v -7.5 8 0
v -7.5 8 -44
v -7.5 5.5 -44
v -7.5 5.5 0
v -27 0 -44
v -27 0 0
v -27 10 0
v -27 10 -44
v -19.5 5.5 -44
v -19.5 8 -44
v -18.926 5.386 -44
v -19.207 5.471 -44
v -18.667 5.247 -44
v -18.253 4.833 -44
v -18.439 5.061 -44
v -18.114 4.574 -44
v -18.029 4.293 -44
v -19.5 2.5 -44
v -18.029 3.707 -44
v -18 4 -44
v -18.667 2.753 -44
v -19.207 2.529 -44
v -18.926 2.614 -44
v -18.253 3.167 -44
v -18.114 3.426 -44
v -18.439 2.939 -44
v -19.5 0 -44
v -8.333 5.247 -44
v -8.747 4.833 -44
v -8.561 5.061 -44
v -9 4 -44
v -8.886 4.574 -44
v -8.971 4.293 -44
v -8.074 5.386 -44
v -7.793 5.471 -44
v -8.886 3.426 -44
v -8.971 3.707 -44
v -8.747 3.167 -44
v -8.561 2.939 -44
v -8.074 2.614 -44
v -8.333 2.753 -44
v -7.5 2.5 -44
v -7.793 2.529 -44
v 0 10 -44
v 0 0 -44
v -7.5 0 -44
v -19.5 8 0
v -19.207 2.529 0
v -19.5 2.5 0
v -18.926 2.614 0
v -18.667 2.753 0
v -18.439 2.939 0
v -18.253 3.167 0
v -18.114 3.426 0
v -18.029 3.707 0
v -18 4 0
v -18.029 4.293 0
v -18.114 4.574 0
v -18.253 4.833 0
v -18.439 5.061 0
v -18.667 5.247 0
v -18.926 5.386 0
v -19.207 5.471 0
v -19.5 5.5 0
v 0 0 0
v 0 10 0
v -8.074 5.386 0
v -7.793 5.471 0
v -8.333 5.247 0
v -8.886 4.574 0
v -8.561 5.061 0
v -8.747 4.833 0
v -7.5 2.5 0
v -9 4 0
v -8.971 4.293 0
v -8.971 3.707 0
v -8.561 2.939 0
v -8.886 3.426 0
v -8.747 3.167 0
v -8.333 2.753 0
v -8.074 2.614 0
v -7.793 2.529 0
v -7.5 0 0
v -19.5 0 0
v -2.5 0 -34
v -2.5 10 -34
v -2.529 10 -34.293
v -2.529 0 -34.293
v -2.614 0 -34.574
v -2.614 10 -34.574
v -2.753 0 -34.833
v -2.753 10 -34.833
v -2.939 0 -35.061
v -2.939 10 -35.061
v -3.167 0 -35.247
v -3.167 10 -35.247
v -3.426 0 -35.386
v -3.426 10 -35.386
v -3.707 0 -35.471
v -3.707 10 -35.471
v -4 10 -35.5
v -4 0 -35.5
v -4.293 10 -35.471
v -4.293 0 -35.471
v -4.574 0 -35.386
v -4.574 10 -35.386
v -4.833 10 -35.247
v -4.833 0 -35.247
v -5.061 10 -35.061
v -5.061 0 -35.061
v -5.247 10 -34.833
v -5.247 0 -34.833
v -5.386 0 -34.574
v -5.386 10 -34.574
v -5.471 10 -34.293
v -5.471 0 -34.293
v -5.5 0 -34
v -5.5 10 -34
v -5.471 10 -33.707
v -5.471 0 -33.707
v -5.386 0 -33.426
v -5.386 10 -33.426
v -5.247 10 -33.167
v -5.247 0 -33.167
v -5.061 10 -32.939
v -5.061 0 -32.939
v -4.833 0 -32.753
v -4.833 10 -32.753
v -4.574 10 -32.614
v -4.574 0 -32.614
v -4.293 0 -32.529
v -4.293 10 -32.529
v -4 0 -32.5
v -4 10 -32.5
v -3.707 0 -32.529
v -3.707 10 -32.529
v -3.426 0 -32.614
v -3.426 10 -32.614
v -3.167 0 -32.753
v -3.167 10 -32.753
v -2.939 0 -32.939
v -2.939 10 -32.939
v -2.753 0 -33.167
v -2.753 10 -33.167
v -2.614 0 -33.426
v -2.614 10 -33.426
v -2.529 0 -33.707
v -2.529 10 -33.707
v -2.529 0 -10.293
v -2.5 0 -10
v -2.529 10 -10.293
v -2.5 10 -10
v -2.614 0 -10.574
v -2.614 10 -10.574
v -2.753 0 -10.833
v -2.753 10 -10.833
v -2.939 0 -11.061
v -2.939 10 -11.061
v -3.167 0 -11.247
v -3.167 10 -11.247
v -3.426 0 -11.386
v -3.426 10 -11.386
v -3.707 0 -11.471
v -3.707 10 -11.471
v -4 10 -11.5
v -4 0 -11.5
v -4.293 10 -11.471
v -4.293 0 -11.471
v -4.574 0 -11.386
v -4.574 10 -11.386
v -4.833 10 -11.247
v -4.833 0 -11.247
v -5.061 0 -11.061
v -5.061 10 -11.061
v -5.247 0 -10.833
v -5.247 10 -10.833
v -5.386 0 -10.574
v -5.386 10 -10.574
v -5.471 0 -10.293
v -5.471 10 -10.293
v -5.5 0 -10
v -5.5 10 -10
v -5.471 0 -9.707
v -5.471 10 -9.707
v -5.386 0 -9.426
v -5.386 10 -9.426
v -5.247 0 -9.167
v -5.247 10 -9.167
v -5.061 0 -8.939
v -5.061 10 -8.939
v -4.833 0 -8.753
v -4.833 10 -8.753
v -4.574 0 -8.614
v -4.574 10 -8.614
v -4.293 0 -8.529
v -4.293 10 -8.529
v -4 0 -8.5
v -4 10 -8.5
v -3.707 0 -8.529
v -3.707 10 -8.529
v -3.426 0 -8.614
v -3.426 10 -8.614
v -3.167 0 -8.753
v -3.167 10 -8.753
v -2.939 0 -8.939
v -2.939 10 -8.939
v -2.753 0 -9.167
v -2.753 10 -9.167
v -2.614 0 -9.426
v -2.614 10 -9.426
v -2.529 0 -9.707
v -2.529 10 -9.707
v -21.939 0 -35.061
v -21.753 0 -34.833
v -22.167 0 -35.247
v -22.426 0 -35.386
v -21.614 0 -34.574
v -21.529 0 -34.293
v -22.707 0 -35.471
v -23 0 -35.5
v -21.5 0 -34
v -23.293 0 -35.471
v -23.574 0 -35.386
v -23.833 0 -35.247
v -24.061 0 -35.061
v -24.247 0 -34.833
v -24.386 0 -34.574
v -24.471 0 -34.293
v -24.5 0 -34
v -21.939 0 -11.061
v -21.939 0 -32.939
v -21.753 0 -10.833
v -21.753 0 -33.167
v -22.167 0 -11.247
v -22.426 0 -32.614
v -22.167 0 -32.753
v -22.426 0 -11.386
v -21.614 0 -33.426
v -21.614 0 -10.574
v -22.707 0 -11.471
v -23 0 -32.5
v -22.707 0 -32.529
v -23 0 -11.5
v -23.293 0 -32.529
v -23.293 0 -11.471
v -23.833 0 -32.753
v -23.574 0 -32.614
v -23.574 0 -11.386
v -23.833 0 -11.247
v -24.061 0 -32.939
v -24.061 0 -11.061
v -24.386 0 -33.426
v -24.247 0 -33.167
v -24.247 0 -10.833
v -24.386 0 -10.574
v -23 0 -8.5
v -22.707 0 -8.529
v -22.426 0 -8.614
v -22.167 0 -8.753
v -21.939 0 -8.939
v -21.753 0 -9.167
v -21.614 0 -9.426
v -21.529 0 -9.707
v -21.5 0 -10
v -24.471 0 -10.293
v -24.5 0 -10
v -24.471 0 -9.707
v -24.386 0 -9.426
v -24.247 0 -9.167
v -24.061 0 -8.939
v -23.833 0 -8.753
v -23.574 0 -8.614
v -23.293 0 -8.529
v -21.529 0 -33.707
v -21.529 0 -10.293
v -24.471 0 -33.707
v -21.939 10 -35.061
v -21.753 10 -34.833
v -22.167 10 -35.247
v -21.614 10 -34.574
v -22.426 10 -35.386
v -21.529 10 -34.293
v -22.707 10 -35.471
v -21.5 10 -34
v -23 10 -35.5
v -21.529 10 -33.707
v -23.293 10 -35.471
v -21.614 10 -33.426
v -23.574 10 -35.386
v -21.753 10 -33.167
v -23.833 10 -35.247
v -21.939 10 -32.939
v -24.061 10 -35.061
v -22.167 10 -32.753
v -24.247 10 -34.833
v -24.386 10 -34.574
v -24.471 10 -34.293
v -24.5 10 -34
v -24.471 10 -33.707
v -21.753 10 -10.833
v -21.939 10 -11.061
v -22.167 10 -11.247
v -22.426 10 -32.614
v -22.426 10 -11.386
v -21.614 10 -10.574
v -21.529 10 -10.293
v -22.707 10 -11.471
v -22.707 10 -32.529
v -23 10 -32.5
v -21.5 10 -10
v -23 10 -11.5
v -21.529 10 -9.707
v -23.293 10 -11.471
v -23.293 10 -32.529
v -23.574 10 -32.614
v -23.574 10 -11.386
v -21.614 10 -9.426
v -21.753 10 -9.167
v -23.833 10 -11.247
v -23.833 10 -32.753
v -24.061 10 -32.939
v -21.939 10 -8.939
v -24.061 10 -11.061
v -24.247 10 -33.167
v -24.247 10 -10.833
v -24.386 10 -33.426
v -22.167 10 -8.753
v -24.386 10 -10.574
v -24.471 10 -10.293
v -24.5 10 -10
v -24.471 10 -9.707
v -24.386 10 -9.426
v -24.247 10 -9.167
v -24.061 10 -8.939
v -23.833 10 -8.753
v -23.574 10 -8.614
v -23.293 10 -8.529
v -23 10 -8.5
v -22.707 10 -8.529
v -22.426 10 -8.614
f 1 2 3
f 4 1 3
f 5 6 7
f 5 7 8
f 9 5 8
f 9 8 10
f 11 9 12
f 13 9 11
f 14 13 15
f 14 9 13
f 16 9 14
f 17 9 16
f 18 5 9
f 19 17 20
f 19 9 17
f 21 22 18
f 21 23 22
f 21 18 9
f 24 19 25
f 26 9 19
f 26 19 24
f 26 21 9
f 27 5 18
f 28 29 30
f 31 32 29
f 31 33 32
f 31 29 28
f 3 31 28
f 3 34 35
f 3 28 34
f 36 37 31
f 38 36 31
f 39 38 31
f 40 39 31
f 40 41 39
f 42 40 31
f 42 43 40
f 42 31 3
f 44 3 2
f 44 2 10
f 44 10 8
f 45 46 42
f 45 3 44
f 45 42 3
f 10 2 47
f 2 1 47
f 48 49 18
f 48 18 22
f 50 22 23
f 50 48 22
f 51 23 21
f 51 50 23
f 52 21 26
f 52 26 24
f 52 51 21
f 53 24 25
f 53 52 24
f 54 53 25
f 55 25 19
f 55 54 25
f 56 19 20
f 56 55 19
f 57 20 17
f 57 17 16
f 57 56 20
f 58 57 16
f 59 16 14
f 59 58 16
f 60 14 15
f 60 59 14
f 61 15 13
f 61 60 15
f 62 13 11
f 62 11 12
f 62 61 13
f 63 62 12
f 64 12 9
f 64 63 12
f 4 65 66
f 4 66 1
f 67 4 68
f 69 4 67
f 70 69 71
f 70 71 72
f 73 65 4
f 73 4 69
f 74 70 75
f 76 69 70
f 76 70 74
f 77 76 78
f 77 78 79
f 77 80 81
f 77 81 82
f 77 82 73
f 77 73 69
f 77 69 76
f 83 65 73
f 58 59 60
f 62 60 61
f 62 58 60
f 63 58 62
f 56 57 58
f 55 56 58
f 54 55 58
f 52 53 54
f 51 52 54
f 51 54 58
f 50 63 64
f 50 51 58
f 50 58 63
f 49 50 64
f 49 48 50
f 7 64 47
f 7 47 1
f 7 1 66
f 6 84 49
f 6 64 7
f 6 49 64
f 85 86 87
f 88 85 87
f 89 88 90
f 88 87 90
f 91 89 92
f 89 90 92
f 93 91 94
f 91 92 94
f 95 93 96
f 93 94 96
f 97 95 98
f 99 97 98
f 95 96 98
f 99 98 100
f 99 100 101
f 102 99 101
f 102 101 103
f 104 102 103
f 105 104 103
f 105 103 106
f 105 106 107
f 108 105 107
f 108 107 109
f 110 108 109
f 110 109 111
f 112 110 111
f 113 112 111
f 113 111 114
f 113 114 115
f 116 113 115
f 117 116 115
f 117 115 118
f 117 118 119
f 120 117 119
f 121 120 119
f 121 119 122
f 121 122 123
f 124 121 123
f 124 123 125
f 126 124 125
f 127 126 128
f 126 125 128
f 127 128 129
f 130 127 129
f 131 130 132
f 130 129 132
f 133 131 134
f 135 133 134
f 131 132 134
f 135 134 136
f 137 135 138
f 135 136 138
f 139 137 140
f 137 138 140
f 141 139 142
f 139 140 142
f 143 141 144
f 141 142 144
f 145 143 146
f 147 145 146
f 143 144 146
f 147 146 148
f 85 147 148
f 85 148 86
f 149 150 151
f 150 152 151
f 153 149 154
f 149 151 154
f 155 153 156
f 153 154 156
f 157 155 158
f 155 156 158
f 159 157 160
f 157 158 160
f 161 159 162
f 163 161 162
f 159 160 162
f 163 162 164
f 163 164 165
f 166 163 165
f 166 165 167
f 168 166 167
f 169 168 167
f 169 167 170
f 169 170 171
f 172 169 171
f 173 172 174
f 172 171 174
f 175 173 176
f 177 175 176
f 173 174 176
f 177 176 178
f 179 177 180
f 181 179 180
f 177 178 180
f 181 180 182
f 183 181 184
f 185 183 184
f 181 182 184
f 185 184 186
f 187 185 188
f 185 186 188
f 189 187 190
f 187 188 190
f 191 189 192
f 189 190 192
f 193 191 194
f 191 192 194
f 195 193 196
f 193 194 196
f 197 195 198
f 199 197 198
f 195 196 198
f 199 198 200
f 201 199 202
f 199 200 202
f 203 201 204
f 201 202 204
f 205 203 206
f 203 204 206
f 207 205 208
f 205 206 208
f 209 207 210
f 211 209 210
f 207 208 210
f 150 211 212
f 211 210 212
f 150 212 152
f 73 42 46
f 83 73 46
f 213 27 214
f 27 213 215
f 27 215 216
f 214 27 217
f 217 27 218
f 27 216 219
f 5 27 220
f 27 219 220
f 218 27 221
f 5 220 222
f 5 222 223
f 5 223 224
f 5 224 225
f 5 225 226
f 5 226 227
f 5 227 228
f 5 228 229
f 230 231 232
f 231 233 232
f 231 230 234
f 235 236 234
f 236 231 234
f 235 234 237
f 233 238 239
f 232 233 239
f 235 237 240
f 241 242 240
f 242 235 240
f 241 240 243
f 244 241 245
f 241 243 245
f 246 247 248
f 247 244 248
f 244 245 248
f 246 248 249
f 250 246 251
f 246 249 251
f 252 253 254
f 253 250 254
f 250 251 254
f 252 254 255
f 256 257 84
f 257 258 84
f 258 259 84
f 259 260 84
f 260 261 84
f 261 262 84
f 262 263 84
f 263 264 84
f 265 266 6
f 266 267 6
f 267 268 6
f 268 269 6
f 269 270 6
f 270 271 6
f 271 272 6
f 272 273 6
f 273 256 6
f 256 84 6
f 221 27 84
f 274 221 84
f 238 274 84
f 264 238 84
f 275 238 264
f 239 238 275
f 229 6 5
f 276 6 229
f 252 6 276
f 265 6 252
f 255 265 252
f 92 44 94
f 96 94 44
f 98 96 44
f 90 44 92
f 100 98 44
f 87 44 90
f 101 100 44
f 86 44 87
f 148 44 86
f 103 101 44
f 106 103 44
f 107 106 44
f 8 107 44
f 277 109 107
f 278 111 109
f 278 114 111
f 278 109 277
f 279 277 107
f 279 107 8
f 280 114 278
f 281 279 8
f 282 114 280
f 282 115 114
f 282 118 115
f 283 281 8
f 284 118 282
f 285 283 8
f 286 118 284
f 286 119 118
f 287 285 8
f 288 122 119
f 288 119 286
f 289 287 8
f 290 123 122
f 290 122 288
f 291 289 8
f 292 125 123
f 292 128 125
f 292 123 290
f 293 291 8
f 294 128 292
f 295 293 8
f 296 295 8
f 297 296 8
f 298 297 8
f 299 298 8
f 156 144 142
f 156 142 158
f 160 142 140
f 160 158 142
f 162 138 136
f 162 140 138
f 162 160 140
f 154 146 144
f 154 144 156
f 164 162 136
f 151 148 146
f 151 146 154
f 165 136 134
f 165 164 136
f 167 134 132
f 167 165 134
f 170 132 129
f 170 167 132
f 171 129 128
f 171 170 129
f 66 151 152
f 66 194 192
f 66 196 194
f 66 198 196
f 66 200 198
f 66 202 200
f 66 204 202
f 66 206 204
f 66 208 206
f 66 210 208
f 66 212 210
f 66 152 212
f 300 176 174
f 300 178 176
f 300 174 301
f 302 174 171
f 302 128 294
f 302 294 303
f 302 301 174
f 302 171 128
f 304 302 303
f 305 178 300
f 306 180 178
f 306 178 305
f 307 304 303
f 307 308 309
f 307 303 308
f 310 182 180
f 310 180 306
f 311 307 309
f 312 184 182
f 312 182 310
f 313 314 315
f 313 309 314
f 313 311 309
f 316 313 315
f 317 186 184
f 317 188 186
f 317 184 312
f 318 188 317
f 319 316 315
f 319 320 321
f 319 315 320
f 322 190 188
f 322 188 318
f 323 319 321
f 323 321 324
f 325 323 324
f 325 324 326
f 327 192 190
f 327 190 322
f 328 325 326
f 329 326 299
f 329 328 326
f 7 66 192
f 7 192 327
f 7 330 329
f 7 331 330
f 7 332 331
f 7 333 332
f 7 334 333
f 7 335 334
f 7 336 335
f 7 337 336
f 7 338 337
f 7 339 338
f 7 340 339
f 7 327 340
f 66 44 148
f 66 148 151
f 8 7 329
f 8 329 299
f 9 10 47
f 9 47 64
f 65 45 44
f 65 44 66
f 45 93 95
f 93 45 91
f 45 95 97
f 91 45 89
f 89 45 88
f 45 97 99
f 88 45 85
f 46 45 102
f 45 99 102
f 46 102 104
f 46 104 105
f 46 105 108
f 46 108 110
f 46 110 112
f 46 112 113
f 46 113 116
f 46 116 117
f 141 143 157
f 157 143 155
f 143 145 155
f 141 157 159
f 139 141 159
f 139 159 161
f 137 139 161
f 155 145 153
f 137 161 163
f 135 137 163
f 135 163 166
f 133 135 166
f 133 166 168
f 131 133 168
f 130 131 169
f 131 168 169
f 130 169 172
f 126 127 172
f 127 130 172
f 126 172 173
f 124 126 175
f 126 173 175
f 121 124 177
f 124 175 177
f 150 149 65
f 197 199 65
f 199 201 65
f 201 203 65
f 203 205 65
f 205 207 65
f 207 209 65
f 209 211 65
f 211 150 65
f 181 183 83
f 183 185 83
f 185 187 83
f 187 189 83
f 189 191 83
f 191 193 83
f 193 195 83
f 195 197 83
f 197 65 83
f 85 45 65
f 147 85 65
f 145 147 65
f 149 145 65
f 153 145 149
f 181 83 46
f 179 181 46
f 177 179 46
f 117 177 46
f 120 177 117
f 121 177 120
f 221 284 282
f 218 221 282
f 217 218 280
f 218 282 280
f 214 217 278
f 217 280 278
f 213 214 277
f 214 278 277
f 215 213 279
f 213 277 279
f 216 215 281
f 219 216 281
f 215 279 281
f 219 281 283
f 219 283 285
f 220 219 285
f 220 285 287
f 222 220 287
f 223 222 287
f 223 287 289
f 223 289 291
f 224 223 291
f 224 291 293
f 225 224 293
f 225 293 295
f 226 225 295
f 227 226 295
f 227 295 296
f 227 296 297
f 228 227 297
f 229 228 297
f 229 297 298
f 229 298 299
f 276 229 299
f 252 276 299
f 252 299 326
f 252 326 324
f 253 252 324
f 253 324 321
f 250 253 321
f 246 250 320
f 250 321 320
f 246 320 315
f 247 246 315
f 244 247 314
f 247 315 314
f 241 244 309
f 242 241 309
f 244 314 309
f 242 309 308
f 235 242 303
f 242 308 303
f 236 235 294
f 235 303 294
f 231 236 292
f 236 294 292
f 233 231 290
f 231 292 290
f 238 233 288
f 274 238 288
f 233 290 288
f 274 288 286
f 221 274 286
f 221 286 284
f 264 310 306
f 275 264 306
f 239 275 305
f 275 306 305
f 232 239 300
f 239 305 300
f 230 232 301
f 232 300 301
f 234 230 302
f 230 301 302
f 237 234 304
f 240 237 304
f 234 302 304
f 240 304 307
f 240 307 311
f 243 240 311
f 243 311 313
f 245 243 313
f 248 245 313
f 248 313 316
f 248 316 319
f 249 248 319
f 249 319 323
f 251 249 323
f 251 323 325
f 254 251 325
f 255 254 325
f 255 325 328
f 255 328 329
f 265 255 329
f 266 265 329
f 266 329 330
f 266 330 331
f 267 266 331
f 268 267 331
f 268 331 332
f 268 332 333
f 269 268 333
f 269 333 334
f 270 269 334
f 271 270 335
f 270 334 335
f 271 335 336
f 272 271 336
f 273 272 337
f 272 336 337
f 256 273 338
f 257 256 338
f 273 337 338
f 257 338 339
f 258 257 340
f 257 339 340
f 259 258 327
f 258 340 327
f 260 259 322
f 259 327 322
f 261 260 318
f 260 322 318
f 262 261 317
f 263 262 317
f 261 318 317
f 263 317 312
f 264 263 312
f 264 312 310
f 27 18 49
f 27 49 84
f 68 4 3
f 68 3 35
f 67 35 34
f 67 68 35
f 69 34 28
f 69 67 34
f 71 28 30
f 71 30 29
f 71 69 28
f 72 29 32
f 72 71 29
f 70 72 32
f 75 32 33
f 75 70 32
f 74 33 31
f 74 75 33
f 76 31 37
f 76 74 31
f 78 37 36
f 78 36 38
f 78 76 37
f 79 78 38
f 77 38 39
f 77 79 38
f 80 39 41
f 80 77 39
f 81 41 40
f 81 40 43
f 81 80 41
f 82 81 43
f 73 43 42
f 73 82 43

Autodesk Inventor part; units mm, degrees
ref_plane "YZ Plane" through (0, 0, 0) normal (1, 0, 0) x (0, 1, 0)
ref_plane "XZ Plane" through (0, 0, 0) normal (0, 1, 0) x (-1, 0, 0)
ref_plane "XY Plane" through (0, 0, 0) normal (0, 0, 1) x (1, 0, 0)
sketch "草图1" plane through (0, 0, 0) normal (0, 1, 0) x (-1, 0, 0)
  line L0 (0, 0) -> (27, 0)
  line L1 (27, 0) -> (27, -44)
  line L2 (27, -44) -> (0, -44)
  line L3 (0, -44) -> (0, 0)
  dimension "d0" = 44
  dimension "d1" = 27
extrude "拉伸1" add sketch "草图1" along normal blind 10
sketch "草图2" plane through (-27, 0, 0) normal (0, 0, 1) x (1, 0, 0)
  line L0 (0, 10) -> (27, 10) projected
  line L1 (13.5, 10) -> (13.5, 0)
  line L2 (13.5, 10) -> (7.5, 10)
  line L3 (7.5, 10) -> (19.5, 10)
  line L4 (7.5, 10) -> (7.5, 0)
  line L5 (0, 0) -> (27, 0) projected
  line L6 (19.5, 10) -> (19.5, 0)
  line L7 (7.5, 0) -> (19.5, 0)
  line L8 (7.5, 0) -> (19.5, 0)
  line L9 (19.5, 0) -> (19.5, 8)
  line L10 (19.5, 8) -> (7.5, 8)
  line L11 (7.5, 8) -> (7.5, 0)
  point P0 (7.5, 8)
  dimension "d19" = 6
  dimension "d20" = 12
  dimension "d21" = 8
extrude "拉伸2" cut sketch "草图2" against normal through all contours L10 L1 L5 L4 | L10 L6 L5 L1
sketch "草图3" plane through (-27, 10, 0) normal (0, 0, 1) x (1, 0, 0)
  line L0 (7.5, -10) -> (7.5, -2) projected
  circle A0 centre (7.5, -6) radius 1.5
  line L1 (19.5, -2) -> (19.5, -10) projected
  circle A1 centre (19.5, -6) radius 1.5
  point P0 (27, -10)
  point P1 (19.5, -7.5)
  point P2 (19.5, -4.5)
  point P3 (7.5, -4.5)
  point P4 (7.5, -7.5)
  dimension "d22" = 3
  dimension "d23" = 3
extrude "拉伸3" add sketch "草图3" against normal blind 44 contours L0 A0 | L1 A1 picked at (8.2992, -6.2203) picked at (19.2676, -6.4427)
sketch "草图4" plane through (0, 10, 0) normal (0, 1, 0) x (1, 0, 0)
  circle A0 centre (-23, 34) radius 1.5
  line L0 (-6, 44) -> (-21, 44) projected
  circle A1 centre (-4, 34) radius 1.5
  circle A2 centre (-23, 10) radius 1.5
  circle A3 centre (-4, 10) radius 1.5
  line L1 (-27.606, 22) -> (3.9148, 22)
  line L2 (-13.5, 45.1542) -> (-13.5, -11.9454)
  point P0 (0, 0)
  point P1 (-27, 44)
  dimension "d15" = 3
  dimension "d24" = 12
  dimension "d25" = 9.5
extrude "拉伸4" cut sketch "草图4" against normal blind 10
equation "\"折弯半径\" = 厚度"
equation "\"折弯释压宽度\" = 厚度"
equation "\"折弯释压深度\" = 0.5 * 厚度"
equation "\"拐角释压尺寸\" = 4 * 厚度"
equation "\"最小余量\" = 2 * 厚度"
equation "\"过渡半径\" = 折弯半径"
equation "\"Jacobi半径尺寸\" = 折弯半径"
equation "\"间隙大小\" = 厚度"
equation "\"厚度\" = 0.5"
properties part number "滑轨座"
